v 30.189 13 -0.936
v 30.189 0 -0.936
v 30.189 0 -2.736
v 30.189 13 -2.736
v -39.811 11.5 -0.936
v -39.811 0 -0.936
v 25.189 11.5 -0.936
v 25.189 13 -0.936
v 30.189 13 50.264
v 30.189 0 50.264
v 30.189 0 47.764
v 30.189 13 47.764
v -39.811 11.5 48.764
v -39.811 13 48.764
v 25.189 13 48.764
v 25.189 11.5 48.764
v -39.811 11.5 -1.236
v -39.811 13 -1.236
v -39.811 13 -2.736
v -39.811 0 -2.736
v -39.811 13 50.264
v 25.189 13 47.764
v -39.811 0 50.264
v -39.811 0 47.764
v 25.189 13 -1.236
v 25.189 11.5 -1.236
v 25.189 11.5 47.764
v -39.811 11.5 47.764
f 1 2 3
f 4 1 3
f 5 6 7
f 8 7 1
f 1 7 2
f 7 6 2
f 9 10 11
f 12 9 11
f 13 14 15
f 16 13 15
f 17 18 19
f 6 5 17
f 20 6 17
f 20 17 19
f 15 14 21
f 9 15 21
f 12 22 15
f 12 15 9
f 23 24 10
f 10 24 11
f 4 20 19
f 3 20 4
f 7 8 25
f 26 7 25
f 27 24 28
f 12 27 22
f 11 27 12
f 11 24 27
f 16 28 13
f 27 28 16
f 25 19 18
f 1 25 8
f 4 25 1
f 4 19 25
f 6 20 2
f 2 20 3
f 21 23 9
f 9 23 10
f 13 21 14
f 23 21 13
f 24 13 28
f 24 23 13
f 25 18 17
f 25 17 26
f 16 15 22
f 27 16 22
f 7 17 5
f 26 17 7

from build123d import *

# Parameters (mm, degrees)
SKETCH3_W             = 70
SKETCH3_H             = 1.8
BOSS_EXTRUDE1_DEPTH   = 13
SKETCH3_H_2           = 2.5
BOSS_EXTRUDE1_2_DEPTH = 13
SKETCH4_W             = 65
SKETCH4_H             = 1
CUT_EXTRUDE1_DEPTH    = 1.5
SKETCH5_W             = 65
SKETCH5_H             = 0.3
CUT_EXTRUDE2_DEPTH    = 1.5


with BuildPart() as part:
    # Sketch3 → Boss-Extrude1 (new body)
    with BuildSketch(Plane(origin=(0, 0, 0), x_dir=(1, 0, 0), z_dir=(0, 1, 0))):
        with Locations((-4.811320755, 1.835849057)):
            Rectangle(SKETCH3_W, SKETCH3_H)
    extrude(amount=BOSS_EXTRUDE1_DEPTH)

    # Sketch5 → Cut-Extrude2 (cut)
    with BuildSketch(Plane(origin=(0, 13, 0), x_dir=(1, 0, 0), z_dir=(0, 1, 0))):
        with Locations((-7.311320755, 1.085849057)):
            Rectangle(SKETCH5_W, SKETCH5_H)
    extrude(amount=-CUT_EXTRUDE2_DEPTH, mode=Mode.SUBTRACT)


with BuildPart() as body_2:
    # Sketch3 → Boss-Extrude1 2 (new body)
    with BuildSketch(Plane(origin=(0, 0, 0), x_dir=(1, 0, 0), z_dir=(0, 1, 0))):
        with Locations((-4.811320755, -49.014150943)):
            Rectangle(SKETCH3_W, SKETCH3_H_2)
    extrude(amount=BOSS_EXTRUDE1_2_DEPTH)

    # Sketch4 → Cut-Extrude1 (cut)
    with BuildSketch(Plane(origin=(0, 13, 0), x_dir=(1, 0, 0), z_dir=(0, 1, 0))):
        with Locations((-7.311320755, -48.264150943)):
            Rectangle(SKETCH4_W, SKETCH4_H)
    extrude(amount=-CUT_EXTRUDE1_DEPTH, mode=Mode.SUBTRACT)


solid = Compound([part.part, body_2.part])
